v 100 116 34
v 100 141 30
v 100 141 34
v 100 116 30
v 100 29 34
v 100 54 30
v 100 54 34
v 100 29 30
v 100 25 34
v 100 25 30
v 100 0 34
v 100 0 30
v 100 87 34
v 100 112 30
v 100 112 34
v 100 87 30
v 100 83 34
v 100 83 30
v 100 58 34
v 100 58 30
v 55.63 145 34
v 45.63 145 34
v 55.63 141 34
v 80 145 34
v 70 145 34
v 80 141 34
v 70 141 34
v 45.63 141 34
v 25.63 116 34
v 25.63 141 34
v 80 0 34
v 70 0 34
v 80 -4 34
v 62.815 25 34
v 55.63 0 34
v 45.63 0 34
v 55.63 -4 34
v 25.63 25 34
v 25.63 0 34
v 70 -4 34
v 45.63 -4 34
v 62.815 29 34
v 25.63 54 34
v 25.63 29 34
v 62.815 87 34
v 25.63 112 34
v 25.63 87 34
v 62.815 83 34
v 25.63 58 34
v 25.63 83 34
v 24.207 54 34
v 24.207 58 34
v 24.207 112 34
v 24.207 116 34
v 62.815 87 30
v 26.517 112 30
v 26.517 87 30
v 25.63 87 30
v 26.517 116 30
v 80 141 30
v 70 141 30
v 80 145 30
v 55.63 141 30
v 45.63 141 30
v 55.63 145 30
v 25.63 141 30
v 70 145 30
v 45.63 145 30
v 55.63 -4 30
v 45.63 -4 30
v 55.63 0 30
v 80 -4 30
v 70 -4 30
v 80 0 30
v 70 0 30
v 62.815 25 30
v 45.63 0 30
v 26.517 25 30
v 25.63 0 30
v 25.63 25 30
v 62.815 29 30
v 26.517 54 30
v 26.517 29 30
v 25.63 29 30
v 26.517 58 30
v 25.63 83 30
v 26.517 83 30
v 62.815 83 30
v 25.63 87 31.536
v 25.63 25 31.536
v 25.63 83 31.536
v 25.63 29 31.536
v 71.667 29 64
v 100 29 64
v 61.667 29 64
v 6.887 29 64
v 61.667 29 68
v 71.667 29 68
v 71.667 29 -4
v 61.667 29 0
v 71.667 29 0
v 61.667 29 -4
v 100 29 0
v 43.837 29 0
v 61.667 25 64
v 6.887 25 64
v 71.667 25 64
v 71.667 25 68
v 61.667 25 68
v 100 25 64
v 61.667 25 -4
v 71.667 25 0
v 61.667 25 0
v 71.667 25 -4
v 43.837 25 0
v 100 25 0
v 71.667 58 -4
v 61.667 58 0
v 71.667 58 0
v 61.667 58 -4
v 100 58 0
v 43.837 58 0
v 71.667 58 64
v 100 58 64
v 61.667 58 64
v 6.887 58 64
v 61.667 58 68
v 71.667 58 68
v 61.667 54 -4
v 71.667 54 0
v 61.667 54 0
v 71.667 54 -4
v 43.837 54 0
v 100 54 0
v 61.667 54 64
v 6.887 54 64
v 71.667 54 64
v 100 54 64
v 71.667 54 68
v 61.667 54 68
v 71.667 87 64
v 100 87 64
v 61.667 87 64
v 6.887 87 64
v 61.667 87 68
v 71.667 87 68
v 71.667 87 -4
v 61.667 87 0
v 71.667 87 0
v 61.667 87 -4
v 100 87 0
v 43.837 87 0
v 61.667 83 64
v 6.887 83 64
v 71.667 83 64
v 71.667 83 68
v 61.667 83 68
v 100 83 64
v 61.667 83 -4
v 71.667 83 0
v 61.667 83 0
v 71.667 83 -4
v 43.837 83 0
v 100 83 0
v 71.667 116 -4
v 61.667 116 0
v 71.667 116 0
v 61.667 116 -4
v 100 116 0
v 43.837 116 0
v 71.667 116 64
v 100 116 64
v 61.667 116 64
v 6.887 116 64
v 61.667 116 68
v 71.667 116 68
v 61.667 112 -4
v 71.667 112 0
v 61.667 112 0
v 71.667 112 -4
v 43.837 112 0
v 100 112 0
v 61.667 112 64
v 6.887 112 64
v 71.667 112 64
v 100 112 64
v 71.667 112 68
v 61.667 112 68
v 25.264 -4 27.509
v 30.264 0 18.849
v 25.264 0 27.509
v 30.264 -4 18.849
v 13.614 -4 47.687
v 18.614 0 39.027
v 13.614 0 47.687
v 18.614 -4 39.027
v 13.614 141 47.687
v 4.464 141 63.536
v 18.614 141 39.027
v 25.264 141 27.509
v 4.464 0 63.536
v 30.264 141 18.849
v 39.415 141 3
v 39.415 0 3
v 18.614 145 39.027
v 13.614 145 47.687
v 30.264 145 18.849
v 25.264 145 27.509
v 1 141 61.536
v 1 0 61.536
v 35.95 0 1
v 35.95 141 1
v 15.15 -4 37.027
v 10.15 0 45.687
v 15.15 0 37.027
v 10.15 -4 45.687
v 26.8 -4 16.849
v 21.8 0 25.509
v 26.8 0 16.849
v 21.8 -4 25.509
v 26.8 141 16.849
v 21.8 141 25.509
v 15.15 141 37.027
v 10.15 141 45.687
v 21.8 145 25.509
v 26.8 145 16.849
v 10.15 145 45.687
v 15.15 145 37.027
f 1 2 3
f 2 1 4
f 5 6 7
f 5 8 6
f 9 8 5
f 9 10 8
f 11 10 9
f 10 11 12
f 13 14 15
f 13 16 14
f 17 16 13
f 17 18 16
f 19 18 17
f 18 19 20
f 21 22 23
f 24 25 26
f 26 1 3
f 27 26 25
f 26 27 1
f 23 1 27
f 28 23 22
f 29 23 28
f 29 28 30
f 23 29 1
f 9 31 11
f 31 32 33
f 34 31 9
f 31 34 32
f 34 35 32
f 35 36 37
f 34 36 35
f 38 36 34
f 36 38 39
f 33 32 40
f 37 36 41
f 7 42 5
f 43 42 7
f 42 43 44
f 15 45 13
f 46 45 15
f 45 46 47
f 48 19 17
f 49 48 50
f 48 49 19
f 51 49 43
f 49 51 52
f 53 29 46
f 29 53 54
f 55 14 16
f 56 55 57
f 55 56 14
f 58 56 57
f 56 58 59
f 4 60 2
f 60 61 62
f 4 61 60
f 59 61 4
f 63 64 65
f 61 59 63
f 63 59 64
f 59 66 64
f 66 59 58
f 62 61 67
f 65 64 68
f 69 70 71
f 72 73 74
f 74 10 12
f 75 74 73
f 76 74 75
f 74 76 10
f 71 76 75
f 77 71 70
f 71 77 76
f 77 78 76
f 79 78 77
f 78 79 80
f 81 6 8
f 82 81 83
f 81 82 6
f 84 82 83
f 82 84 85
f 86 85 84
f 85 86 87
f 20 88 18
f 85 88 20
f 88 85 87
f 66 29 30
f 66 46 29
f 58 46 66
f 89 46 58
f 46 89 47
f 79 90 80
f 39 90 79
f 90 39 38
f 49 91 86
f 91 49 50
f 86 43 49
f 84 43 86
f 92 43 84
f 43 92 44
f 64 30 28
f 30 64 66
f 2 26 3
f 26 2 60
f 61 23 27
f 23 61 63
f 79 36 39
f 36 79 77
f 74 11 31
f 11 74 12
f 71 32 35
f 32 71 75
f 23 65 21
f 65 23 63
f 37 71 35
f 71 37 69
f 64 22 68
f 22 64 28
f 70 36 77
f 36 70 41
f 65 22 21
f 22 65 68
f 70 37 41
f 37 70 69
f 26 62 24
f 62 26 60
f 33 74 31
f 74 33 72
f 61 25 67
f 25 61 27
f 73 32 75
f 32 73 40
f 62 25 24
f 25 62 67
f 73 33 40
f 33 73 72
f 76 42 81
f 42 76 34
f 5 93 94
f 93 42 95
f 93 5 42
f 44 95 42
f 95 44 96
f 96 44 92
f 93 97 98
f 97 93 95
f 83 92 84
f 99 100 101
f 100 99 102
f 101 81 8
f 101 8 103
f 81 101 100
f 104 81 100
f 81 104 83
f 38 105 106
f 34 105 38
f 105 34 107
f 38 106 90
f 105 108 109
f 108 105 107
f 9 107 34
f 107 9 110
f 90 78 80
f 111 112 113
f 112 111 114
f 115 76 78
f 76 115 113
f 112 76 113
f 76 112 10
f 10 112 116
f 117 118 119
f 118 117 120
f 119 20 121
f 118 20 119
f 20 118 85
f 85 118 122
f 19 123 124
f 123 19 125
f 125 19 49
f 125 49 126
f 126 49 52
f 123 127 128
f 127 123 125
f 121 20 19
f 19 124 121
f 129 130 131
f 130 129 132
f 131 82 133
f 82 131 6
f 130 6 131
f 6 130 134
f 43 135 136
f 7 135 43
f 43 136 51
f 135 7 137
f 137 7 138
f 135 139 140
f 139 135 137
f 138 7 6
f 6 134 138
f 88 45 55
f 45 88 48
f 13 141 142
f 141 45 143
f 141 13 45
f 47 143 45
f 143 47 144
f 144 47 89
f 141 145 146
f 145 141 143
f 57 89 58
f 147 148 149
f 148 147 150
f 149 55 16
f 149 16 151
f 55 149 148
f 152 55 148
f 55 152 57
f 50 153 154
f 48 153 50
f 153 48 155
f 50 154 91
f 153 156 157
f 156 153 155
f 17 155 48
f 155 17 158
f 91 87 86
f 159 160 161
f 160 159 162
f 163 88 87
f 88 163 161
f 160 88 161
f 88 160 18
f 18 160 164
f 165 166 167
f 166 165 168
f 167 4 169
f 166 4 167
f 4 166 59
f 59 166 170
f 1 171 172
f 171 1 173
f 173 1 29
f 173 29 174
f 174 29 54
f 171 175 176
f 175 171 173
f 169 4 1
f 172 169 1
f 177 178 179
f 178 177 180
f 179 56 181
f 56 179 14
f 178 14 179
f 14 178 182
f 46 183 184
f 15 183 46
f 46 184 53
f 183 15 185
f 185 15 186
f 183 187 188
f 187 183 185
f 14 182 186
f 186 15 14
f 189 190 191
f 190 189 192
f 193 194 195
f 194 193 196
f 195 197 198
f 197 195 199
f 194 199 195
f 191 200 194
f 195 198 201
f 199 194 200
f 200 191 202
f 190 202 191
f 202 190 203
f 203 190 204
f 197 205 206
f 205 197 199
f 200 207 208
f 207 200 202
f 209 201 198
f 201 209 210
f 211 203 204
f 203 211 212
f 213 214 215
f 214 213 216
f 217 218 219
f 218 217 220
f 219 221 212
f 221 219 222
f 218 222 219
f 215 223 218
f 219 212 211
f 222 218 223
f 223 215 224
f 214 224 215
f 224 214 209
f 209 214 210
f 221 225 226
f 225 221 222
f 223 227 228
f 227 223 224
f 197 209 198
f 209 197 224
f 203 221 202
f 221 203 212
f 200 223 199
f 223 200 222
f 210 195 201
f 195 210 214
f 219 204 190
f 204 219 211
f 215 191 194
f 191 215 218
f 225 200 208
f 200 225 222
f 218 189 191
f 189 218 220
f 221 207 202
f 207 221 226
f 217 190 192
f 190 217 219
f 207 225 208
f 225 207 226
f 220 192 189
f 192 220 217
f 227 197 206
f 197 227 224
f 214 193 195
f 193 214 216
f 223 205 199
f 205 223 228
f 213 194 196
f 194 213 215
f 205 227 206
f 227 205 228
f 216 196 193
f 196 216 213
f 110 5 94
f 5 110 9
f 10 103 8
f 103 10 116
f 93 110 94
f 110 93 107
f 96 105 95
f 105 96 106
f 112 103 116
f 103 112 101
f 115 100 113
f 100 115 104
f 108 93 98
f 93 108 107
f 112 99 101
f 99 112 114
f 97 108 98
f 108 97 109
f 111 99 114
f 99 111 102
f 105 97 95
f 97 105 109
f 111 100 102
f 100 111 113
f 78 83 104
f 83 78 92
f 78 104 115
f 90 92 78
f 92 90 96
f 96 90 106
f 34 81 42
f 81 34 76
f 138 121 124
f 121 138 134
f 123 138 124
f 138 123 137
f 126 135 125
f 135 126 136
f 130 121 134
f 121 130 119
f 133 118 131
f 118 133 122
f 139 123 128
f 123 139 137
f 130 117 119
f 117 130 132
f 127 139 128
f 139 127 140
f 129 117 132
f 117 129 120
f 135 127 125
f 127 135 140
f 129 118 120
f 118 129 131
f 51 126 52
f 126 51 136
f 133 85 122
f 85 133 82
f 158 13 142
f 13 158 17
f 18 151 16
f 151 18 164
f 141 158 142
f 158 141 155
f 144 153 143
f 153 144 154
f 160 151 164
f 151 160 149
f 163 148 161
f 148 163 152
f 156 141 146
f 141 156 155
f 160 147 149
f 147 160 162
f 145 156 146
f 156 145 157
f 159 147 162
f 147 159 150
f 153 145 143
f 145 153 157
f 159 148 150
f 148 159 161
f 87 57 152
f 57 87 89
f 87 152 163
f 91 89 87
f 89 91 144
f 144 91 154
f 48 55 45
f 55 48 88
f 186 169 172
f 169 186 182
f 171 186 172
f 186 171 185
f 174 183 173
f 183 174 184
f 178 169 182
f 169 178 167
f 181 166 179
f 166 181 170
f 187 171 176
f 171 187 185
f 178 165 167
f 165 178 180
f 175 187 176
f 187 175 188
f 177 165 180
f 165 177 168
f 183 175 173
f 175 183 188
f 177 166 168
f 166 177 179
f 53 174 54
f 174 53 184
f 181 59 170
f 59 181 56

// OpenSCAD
// file: dimensions.scad
// This file regroup all the common dimensions, angles, and repetitions
$thick_gap = 25;
$height_gap = 30;
$material_thickness = 4;
$slant_angle = 30;
$insideHeight = 100;
$outsetMargin = 10;
$horizontalPlacements = 5;
// main file
include <./dimensions.scad>

// inside-slant offset ->
offset = $material_thickness + ($height_gap + $material_thickness) / tan (90-$slant_angle) + 2;
margin = 5;

insideWidth = $horizontalPlacements * $thick_gap + ($horizontalPlacements - 1) * $material_thickness;

module horizontalPlank(height) {
  offsetted_height = height - offset;
  difference () {
    union() {
      //base
      cube([offsetted_height, insideWidth, $material_thickness]);
      // first set of wings
      translate([20, - $material_thickness, 0])
        cube([10, insideWidth + 2 * $material_thickness, $material_thickness]);
      // second set of wings
      translate([offsetted_height - 30, - $material_thickness, 0])
        cube([10, insideWidth + 2 * $material_thickness, $material_thickness]);
    }
    // notches
    for(i=[0:($horizontalPlacements - 2)]) {
      horizontalShift = (i + 1) * $thick_gap + (i *  $material_thickness);
      if (i % 2 == 0){
        translate([- margin, horizontalShift, - margin ])
        cube([offsetted_height / 2 + margin, $material_thickness, 2*margin +  $material_thickness]);
      } else {
        translate([offsetted_height / 2, horizontalShift, - margin])
        cube([offsetted_height / 2 + margin, $material_thickness, 2*margin + $material_thickness]);
      }
    }
  }
}

module insideSlant() {
  slantHeight = (2 * $height_gap + $material_thickness) / sin(90 - $slant_angle) - $material_thickness;
  union() {
    cube([$material_thickness, insideWidth, slantHeight]);
    translate([0, - $material_thickness, (slantHeight / 3) - 5])
    cube([$material_thickness, insideWidth + 2 * $material_thickness, 10]);
    translate([0, - $material_thickness, 2 * (slantHeight / 3) - 5])
    cube([$material_thickness, insideWidth + 2 * $material_thickness, 10]);
  }
}

module verticalSeparator(height, front_notch = true) {
  offsetted_height = height - offset;
  separatorWidth = 2 * $height_gap + $material_thickness;

  base = 4 + margin;
  bottomOffset = base + (separatorWidth + 2 * margin) / tan(90-$slant_angle);

  // wedge cutout
  wedgePoints = [
    [0, 0, separatorWidth + 2 * margin], // 0
    [base, 0, separatorWidth + 2 * margin], // 1
    [bottomOffset, 0, 0], // 2
    [0, 0, 0], // 3
    [0, $material_thickness + 2 * margin, separatorWidth + 2 * margin], // 4
    [base, $material_thickness + 2 * margin, separatorWidth + 2 * margin], // 5
    [bottomOffset, $material_thickness + 2 * margin, 0], // 6
    [0, $material_thickness + 2 * margin, 0] // 7
  ];
  wedgeFaces = [
    [4, 5, 1, 0], // top
    [0, 1, 2, 3], // front
    [5, 6, 2, 1], // side
    [7, 6, 5, 4], // back
    [6, 7, 3, 2], // bottom
    [7, 4, 0, 3] // other side
  ];


  difference() {
    union() {
      cube([height, $material_thickness, separatorWidth]);
      translate([2 * height / 3 - 5, 0, - $material_thickness])
        cube([10, $material_thickness, separatorWidth + 2 * $material_thickness]);
    }
    translate([-margin, -margin, -margin])
      polyhedron(wedgePoints, wedgeFaces);
    if (front_notch) {
      translate([offset + offsetted_height / 2, -margin, $height_gap])
        cube([offsetted_height / 2 + margin, $material_thickness + 2 * margin, $material_thickness]);
    } else {
      translate([offset - margin, -margin, $height_gap])
        cube([offsetted_height / 2 + margin, $material_thickness + 2 * margin, $material_thickness]);
    }
  }
}

module boxInset(height = $insideHeight) {
  translate([offset, 0, 30])
    horizontalPlank(height);

  translate([($height_gap * 2 + $material_thickness)/ tan(90 - $slant_angle) - 0.25 * $material_thickness, 0, 0.25 * $material_thickness])
  rotate([0, -$slant_angle, 0])
    insideSlant();

  for(i=[0:($horizontalPlacements - 2)]) {
    horizontalShift = [0, (i + 1) * $thick_gap + i * $material_thickness, 0];
    if(i % 2 == 0) {
      color("blue")
      translate(horizontalShift)
      verticalSeparator(height, true);
    } else {
      color("green")
      translate(horizontalShift)
      verticalSeparator(height, false);
    }
  }
}

boxInset();
